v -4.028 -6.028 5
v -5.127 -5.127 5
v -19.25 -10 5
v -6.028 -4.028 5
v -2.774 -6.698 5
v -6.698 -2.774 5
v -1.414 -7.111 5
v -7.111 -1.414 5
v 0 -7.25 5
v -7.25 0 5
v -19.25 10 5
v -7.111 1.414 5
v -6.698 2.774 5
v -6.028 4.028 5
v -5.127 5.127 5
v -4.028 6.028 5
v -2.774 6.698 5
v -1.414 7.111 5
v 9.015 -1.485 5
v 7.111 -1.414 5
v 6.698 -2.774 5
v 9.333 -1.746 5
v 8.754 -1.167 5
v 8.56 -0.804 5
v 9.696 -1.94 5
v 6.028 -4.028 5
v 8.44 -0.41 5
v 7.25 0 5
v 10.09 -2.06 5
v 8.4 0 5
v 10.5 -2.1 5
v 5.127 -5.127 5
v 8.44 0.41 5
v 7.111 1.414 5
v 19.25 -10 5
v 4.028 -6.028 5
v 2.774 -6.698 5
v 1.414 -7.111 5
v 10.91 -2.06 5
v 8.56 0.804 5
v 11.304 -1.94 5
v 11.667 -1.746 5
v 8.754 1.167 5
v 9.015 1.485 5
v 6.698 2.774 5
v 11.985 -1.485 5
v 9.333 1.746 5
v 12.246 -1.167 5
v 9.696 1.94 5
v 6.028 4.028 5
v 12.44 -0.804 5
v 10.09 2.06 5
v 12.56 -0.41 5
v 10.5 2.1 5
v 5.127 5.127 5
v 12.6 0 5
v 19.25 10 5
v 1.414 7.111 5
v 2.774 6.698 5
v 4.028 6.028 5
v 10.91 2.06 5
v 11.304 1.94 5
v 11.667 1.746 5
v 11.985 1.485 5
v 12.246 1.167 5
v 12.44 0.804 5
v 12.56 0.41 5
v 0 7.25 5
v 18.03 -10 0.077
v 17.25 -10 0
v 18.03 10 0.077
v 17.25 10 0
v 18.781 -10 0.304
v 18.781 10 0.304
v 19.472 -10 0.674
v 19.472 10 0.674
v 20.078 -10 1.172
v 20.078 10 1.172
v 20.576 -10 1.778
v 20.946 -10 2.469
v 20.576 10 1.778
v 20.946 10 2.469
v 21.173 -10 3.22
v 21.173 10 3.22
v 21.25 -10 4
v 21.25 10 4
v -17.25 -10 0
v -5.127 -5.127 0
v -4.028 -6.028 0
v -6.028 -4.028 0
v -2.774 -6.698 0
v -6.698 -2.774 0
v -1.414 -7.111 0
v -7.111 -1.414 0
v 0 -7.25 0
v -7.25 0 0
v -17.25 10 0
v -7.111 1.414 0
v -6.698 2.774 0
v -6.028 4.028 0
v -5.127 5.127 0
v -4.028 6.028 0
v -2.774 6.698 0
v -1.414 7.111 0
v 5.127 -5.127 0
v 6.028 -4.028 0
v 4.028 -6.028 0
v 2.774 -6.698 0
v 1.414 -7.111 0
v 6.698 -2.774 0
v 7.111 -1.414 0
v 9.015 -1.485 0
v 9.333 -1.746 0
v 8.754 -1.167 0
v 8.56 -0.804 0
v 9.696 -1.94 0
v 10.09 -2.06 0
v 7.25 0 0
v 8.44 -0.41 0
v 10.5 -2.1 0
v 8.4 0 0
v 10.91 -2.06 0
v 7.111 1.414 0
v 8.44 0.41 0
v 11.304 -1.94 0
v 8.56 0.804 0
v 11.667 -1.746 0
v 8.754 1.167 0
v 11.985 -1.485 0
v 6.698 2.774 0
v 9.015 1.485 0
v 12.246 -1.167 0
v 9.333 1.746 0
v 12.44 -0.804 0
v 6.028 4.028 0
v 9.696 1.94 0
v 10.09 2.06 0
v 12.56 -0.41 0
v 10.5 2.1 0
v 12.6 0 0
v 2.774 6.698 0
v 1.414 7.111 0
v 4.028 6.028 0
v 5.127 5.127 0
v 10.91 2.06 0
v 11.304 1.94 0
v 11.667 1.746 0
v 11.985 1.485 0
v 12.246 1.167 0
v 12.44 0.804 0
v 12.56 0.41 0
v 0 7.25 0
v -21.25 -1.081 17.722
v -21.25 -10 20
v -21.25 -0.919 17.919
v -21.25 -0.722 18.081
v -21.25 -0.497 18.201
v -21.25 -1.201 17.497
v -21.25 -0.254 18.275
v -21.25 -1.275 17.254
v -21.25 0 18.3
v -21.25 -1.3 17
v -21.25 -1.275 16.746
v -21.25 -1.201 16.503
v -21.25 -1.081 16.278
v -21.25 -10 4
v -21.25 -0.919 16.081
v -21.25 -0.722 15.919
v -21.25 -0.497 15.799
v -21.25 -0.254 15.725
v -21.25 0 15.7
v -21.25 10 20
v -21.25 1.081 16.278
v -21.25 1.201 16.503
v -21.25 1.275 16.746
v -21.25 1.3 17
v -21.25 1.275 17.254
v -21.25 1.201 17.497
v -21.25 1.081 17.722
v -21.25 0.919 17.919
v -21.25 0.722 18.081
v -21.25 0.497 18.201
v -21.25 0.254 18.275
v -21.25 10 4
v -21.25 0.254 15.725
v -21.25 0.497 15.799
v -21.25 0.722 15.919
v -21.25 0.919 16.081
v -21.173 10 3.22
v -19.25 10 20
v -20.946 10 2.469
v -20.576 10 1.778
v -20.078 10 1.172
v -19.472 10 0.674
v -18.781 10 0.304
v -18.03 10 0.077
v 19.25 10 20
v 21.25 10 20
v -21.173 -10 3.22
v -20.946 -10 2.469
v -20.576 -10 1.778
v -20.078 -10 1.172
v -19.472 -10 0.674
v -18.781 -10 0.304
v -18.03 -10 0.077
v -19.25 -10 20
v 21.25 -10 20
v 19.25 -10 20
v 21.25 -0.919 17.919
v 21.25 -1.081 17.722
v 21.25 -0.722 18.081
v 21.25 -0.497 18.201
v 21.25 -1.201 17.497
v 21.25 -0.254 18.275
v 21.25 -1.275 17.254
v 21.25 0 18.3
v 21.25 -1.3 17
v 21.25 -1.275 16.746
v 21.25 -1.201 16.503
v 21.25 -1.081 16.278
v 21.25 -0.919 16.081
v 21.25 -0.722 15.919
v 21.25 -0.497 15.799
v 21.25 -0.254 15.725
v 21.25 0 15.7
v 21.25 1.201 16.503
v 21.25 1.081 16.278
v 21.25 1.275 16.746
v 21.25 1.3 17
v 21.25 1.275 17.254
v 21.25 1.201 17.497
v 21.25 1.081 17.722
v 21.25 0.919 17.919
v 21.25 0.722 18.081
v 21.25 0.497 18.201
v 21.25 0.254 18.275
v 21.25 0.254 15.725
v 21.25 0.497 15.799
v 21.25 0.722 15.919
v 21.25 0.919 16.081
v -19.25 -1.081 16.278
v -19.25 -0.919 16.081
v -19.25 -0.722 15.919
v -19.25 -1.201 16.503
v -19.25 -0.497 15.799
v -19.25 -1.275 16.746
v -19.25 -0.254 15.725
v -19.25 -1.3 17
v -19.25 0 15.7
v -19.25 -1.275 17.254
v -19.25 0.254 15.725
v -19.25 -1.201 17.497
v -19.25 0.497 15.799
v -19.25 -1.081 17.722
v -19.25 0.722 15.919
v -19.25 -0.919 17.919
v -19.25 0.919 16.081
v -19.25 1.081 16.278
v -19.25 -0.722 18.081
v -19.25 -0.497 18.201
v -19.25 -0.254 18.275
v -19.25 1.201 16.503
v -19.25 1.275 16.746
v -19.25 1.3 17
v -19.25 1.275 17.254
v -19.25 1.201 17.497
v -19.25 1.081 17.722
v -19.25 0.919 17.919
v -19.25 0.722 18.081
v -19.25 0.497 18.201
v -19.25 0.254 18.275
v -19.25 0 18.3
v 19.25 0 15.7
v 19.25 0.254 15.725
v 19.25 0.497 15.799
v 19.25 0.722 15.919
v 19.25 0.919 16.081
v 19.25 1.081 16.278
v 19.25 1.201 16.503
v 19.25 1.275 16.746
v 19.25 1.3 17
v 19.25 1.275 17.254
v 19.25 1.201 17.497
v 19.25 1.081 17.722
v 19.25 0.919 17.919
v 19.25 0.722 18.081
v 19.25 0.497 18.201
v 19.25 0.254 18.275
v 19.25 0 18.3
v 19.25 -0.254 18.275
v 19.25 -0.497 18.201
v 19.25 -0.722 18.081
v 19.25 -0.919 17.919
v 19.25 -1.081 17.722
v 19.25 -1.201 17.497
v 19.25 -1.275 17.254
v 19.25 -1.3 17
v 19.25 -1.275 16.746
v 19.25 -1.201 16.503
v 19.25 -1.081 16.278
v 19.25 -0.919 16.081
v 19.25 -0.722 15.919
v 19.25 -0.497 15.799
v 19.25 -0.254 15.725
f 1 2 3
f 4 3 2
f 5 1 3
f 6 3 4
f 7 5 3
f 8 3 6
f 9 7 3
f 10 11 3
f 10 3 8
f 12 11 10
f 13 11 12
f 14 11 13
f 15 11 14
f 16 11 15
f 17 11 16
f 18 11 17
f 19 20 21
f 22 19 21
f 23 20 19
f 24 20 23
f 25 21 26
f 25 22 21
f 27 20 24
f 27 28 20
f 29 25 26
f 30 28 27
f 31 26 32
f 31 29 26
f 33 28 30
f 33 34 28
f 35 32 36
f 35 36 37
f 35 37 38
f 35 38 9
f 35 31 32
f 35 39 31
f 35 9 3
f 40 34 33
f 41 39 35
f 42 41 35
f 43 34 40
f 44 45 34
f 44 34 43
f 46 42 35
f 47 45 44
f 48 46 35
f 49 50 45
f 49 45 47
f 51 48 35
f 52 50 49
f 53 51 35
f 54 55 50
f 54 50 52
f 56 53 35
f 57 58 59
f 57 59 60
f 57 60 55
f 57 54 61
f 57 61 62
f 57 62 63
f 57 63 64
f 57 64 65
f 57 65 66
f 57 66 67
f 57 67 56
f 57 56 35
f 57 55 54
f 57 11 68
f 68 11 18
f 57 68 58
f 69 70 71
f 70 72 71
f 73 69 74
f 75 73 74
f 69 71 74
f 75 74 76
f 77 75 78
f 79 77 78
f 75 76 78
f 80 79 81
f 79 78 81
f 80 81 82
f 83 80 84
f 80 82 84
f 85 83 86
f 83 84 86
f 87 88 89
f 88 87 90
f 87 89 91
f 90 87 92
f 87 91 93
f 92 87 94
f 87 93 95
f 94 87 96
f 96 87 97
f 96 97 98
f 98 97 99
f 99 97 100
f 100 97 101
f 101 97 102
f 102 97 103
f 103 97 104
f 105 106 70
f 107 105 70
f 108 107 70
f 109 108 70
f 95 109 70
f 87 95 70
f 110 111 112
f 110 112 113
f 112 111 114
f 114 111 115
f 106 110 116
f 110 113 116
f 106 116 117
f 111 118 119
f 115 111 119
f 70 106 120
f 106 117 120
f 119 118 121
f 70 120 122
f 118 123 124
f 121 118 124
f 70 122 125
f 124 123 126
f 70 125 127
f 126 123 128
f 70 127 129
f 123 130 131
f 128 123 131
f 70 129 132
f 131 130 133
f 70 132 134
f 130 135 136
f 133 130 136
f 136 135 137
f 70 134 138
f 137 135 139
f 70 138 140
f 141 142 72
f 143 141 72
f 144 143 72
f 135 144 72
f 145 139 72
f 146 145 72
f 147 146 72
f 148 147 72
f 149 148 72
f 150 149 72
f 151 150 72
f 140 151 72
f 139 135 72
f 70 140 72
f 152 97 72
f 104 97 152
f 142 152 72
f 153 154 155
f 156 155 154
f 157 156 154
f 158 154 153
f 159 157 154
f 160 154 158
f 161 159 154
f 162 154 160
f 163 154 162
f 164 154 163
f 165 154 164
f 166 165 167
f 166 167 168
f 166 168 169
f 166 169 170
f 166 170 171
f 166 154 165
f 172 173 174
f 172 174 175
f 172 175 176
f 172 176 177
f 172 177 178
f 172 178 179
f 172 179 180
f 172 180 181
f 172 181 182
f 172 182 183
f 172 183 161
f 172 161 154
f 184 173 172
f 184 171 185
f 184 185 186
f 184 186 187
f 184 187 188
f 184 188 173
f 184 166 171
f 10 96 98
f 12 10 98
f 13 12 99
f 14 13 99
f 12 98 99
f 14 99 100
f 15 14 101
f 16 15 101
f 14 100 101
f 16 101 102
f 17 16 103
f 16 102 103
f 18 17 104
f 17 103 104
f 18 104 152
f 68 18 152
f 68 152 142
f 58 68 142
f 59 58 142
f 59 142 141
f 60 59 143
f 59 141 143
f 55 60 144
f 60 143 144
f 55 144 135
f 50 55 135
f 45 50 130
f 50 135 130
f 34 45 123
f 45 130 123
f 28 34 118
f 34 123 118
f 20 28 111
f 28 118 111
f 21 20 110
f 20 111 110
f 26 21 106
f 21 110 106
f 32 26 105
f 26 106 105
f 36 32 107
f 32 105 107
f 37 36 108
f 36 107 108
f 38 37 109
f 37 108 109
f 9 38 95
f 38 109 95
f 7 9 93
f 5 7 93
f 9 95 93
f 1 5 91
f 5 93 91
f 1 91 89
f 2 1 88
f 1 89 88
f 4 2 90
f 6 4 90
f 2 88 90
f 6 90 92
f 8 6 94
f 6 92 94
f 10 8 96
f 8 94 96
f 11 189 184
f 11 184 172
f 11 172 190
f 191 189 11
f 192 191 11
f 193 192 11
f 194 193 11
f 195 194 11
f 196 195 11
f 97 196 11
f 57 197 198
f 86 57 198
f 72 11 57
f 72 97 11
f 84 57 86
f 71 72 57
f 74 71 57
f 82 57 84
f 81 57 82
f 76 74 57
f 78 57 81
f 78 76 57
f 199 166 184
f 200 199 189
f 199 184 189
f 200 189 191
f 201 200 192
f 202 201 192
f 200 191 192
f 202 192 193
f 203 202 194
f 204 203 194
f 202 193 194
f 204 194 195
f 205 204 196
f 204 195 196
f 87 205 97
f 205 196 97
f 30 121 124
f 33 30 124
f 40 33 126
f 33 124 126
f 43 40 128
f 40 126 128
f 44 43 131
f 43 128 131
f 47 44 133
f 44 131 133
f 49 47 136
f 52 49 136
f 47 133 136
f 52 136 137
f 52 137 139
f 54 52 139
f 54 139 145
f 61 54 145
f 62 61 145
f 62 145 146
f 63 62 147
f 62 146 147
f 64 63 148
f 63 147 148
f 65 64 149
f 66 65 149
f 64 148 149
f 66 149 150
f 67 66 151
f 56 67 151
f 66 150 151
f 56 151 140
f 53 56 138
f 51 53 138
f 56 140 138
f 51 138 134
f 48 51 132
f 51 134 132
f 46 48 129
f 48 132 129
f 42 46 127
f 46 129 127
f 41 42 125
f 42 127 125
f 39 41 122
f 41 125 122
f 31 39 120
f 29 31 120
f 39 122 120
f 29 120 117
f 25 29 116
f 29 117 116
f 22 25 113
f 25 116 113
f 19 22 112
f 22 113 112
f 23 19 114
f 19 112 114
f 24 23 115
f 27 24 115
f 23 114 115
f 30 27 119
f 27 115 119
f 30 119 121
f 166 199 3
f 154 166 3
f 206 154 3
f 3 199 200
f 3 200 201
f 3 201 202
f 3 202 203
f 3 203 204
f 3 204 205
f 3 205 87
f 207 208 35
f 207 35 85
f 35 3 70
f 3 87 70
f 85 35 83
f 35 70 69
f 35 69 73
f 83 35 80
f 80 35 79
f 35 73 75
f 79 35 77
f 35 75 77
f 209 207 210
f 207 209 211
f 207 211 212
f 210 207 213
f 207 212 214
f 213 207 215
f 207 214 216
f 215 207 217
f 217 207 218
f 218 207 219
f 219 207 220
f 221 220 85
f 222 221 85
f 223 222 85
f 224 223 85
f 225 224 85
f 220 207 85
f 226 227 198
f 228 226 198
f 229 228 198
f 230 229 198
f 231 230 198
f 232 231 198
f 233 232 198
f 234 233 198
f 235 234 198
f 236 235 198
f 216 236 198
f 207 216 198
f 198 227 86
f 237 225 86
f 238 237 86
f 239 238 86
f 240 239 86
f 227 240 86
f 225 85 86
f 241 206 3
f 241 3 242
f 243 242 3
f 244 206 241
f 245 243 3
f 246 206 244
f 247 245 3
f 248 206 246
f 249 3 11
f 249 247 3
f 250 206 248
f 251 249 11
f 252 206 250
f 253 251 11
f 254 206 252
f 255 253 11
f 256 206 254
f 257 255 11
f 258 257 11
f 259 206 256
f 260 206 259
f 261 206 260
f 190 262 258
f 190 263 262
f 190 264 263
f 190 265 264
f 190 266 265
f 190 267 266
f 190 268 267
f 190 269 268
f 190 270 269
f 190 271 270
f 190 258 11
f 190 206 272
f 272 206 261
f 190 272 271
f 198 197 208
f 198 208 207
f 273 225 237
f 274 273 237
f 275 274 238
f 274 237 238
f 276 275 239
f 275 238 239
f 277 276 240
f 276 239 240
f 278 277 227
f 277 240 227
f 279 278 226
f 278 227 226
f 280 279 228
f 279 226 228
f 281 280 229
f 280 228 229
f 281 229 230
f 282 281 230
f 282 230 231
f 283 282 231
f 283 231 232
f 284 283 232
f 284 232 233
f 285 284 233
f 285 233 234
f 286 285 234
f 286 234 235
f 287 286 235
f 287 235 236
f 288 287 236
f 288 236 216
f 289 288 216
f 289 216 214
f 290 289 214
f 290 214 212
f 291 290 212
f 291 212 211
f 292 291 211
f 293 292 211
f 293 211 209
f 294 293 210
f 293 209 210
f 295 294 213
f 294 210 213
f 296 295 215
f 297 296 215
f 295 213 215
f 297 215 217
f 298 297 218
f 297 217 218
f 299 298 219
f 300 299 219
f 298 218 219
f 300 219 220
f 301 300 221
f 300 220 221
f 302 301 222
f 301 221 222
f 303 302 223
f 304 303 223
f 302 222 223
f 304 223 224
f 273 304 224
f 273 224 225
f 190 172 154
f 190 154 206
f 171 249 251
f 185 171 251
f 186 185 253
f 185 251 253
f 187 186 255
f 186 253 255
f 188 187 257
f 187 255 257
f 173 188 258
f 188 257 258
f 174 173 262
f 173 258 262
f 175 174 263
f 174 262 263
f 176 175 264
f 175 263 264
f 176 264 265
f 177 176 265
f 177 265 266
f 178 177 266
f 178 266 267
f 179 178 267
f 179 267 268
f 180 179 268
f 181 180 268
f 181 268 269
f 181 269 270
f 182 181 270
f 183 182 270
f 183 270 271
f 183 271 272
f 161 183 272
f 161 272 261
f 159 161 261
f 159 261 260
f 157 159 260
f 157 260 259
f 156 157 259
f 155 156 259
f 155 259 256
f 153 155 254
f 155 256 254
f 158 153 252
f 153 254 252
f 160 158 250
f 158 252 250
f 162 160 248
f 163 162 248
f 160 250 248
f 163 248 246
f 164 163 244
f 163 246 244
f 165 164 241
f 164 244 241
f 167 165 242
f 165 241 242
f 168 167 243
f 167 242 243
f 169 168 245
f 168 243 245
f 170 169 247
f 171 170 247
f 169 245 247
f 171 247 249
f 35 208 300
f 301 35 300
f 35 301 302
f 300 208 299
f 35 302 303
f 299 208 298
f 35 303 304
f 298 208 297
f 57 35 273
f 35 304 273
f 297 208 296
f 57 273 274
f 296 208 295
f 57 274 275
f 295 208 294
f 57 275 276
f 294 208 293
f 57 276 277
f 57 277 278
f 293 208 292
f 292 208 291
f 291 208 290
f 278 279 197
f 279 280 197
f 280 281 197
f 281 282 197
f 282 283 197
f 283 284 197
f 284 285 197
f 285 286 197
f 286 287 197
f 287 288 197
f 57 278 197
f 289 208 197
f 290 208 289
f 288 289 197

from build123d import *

# Parameters (mm, degrees)
SKETCH_1_W          = 42.5
SKETCH_1_H          = 20
EXTRUDE_1_DEPTH     = 20
SKETCH_2_W          = 38.5
SKETCH_2_H          = 20
CUT_EXTRUDE_1_DEPTH = 15
SKETCH_3_R          = 7.25
CUT_EXTRUDE_2_DEPTH = 5
CUT_EXTRUDE_3_REACH = 50.023
SKETCH_4_R          = 1.3
SKETCH_5_R          = 2.1
CUT_EXTRUDE_4_DEPTH = 5
FILLET_1_R          = 4


with BuildPart() as part:
    # 草图1 → 凸台-拉伸1 (new body)
    with BuildSketch(Plane.XY):
        Rectangle(SKETCH_1_W, SKETCH_1_H)
    extrude(amount=EXTRUDE_1_DEPTH)

    # 草图2 → 切除-拉伸1 (cut)
    with BuildSketch(Plane.XY.offset(20)):
        Rectangle(SKETCH_2_W, SKETCH_2_H)
    extrude(amount=-CUT_EXTRUDE_1_DEPTH, mode=Mode.SUBTRACT)

    # 草图3 → 切除-拉伸2 (cut)
    with BuildSketch(Plane(origin=(0, 0, 0), x_dir=(-1, 0, 0), z_dir=(0, 0, -1))):
        Circle(SKETCH_3_R)
    extrude(amount=-CUT_EXTRUDE_2_DEPTH, mode=Mode.SUBTRACT)

    # 切除-拉伸3: up to this face of the body (flat: up to its plane)
    cut_extrude_3_end = Plane(part.part.faces().sort_by_distance((-21.25, 0, 10))[0])
    # 草图4 → 切除-拉伸3 (cut, up to the picked face)
    with BuildSketch(Plane(origin=(21.25, 0, 0), x_dir=(0, 0, -1), z_dir=(1, 0, 0)), mode=Mode.PRIVATE) as cut_extrude_3_sk1:
        with Locations((-17, 0)):
            Circle(SKETCH_4_R)
    cut_extrude_3_tool1 = split(extrude(cut_extrude_3_sk1.sketch, amount=-CUT_EXTRUDE_3_REACH, mode=Mode.PRIVATE), bisect_by=cut_extrude_3_end, keep=Keep.BOTH, mode=Mode.PRIVATE)
    add(cut_extrude_3_tool1.solids().sort_by(Axis((21.25, 0, 17), (-1, 0, 0)))[0], mode=Mode.SUBTRACT)

    # 草图5 → 切除-拉伸4 (cut)
    with BuildSketch(Plane(origin=(0, 0, 0), x_dir=(-1, 0, 0), z_dir=(0, 0, -1))):
        with Locations((-10.5, 0)):
            Circle(SKETCH_5_R)
    extrude(amount=-CUT_EXTRUDE_4_DEPTH, mode=Mode.SUBTRACT)

    # 圆角1
    fillet_1_edges = [part.edges().sort_by_distance(p)[0] for p in [
        (-21.25, 0, 0),
        (21.25, 0, 0),
    ]]
    fillet(fillet_1_edges, radius=FILLET_1_R)


solid = part.part
